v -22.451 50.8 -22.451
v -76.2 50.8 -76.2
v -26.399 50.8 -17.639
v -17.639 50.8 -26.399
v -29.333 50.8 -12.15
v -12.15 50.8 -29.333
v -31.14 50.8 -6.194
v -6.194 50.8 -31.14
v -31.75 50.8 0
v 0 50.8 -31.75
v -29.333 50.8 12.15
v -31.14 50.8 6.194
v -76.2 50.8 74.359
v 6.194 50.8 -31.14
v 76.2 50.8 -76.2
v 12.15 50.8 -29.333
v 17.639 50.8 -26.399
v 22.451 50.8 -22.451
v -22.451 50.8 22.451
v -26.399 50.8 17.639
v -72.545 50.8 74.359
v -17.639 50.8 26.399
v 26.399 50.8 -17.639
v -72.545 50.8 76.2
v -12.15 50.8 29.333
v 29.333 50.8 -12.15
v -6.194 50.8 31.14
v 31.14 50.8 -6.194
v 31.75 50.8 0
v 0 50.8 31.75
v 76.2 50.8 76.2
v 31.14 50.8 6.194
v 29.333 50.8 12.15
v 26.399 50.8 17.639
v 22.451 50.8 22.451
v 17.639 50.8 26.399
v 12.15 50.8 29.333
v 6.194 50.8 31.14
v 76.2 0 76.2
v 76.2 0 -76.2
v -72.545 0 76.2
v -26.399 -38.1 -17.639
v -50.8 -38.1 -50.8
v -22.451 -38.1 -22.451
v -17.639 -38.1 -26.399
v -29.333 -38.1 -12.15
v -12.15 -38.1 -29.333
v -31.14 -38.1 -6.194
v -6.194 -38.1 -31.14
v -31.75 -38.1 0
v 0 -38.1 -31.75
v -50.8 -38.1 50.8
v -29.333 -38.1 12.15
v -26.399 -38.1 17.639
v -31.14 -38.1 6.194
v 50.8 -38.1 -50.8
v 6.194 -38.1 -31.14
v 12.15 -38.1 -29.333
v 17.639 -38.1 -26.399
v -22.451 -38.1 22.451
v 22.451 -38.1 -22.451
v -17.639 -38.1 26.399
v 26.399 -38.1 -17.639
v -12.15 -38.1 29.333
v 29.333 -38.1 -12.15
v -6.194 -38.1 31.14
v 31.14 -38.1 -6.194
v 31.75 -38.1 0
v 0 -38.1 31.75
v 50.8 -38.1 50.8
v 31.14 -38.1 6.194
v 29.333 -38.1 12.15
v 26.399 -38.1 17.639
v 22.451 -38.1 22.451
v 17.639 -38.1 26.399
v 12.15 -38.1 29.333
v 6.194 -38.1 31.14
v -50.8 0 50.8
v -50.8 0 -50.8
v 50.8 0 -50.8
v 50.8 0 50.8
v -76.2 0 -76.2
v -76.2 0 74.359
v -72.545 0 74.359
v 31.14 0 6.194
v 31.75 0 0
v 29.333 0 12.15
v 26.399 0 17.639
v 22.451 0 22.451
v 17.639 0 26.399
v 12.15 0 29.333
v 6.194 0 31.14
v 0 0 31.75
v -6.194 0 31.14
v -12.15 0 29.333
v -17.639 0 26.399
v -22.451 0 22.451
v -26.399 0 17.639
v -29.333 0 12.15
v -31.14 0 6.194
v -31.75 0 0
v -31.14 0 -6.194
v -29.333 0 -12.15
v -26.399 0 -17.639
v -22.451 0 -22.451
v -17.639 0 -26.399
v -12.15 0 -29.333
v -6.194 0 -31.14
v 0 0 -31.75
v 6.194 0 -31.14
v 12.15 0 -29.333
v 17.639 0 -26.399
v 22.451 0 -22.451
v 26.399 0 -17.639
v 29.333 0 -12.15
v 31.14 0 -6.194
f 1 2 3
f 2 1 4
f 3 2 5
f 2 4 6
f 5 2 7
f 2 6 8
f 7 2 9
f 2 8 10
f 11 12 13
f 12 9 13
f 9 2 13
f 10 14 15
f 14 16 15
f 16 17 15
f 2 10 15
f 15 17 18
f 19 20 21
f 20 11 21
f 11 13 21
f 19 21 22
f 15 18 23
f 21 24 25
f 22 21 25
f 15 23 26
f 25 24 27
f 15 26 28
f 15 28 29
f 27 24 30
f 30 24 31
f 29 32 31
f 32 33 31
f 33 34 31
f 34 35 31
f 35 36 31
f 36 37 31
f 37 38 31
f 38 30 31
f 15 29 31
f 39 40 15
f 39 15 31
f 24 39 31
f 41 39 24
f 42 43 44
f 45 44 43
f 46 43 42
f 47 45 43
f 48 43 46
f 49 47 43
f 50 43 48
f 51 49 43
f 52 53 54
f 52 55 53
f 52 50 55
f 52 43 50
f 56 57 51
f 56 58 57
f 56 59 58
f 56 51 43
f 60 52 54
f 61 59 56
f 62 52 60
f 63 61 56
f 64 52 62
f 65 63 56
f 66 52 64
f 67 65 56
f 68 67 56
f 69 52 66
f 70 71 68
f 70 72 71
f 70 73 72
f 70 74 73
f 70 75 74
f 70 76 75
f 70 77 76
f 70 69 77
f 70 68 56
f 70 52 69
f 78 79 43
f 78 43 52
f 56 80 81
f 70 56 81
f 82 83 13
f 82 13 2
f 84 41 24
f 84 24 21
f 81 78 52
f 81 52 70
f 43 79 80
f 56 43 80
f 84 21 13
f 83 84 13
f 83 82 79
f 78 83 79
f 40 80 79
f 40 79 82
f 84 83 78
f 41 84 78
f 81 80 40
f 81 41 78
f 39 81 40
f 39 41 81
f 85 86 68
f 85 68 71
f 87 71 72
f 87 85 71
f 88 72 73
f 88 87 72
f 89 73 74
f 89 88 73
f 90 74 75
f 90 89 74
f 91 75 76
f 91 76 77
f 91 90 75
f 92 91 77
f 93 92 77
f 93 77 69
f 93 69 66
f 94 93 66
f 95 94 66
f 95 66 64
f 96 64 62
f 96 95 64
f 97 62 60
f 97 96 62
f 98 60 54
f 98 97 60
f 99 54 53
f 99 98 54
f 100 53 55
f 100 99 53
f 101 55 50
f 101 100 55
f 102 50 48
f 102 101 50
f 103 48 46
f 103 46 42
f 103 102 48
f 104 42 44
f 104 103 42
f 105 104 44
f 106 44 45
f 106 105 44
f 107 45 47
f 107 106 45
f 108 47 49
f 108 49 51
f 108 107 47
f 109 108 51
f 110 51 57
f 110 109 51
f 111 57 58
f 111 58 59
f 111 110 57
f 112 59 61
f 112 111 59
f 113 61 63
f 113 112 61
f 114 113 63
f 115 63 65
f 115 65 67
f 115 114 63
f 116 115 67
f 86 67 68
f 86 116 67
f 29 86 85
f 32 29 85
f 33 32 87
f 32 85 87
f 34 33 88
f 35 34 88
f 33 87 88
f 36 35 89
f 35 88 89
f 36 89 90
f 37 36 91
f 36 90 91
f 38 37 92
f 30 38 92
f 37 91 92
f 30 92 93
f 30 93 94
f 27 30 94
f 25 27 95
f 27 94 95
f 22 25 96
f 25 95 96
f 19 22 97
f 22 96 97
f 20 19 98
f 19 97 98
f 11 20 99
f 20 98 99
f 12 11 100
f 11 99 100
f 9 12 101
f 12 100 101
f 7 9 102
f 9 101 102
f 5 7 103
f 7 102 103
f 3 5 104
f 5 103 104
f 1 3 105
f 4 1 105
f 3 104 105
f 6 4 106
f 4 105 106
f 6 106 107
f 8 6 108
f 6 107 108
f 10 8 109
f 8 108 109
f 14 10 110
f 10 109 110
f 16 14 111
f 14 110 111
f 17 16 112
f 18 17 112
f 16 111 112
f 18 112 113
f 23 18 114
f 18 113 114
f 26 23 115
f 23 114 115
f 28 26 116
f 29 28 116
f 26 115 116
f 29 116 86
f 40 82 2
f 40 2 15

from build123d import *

# Parameters (mm, degrees)
F0_W     = 101.6
F0_H     = 101.6
F0_R     = 31.75
F1_DEPTH = 38.1
F2_R     = 31.75
F3_DEPTH = 50.8


with BuildPart() as f1:
    # F0 (on Front) → F1 (new body)
    with BuildSketch(Plane.XZ):
        Rectangle(F0_W, F0_H)
        Circle(F0_R, mode=Mode.SUBTRACT)
    extrude(amount=F1_DEPTH)

    # F2 (on Front) → F3 (join)
    with BuildSketch(Plane.XZ):
        Polygon((-72.544911, 76.2), (-72.544911, 74.35935), (-76.2, 74.35935), (-76.2, -76.2), (76.2, -76.2), (76.2, 76.2), align=None)
        Circle(F2_R, mode=Mode.SUBTRACT)
    extrude(amount=-F3_DEPTH)


solid = f1.part
